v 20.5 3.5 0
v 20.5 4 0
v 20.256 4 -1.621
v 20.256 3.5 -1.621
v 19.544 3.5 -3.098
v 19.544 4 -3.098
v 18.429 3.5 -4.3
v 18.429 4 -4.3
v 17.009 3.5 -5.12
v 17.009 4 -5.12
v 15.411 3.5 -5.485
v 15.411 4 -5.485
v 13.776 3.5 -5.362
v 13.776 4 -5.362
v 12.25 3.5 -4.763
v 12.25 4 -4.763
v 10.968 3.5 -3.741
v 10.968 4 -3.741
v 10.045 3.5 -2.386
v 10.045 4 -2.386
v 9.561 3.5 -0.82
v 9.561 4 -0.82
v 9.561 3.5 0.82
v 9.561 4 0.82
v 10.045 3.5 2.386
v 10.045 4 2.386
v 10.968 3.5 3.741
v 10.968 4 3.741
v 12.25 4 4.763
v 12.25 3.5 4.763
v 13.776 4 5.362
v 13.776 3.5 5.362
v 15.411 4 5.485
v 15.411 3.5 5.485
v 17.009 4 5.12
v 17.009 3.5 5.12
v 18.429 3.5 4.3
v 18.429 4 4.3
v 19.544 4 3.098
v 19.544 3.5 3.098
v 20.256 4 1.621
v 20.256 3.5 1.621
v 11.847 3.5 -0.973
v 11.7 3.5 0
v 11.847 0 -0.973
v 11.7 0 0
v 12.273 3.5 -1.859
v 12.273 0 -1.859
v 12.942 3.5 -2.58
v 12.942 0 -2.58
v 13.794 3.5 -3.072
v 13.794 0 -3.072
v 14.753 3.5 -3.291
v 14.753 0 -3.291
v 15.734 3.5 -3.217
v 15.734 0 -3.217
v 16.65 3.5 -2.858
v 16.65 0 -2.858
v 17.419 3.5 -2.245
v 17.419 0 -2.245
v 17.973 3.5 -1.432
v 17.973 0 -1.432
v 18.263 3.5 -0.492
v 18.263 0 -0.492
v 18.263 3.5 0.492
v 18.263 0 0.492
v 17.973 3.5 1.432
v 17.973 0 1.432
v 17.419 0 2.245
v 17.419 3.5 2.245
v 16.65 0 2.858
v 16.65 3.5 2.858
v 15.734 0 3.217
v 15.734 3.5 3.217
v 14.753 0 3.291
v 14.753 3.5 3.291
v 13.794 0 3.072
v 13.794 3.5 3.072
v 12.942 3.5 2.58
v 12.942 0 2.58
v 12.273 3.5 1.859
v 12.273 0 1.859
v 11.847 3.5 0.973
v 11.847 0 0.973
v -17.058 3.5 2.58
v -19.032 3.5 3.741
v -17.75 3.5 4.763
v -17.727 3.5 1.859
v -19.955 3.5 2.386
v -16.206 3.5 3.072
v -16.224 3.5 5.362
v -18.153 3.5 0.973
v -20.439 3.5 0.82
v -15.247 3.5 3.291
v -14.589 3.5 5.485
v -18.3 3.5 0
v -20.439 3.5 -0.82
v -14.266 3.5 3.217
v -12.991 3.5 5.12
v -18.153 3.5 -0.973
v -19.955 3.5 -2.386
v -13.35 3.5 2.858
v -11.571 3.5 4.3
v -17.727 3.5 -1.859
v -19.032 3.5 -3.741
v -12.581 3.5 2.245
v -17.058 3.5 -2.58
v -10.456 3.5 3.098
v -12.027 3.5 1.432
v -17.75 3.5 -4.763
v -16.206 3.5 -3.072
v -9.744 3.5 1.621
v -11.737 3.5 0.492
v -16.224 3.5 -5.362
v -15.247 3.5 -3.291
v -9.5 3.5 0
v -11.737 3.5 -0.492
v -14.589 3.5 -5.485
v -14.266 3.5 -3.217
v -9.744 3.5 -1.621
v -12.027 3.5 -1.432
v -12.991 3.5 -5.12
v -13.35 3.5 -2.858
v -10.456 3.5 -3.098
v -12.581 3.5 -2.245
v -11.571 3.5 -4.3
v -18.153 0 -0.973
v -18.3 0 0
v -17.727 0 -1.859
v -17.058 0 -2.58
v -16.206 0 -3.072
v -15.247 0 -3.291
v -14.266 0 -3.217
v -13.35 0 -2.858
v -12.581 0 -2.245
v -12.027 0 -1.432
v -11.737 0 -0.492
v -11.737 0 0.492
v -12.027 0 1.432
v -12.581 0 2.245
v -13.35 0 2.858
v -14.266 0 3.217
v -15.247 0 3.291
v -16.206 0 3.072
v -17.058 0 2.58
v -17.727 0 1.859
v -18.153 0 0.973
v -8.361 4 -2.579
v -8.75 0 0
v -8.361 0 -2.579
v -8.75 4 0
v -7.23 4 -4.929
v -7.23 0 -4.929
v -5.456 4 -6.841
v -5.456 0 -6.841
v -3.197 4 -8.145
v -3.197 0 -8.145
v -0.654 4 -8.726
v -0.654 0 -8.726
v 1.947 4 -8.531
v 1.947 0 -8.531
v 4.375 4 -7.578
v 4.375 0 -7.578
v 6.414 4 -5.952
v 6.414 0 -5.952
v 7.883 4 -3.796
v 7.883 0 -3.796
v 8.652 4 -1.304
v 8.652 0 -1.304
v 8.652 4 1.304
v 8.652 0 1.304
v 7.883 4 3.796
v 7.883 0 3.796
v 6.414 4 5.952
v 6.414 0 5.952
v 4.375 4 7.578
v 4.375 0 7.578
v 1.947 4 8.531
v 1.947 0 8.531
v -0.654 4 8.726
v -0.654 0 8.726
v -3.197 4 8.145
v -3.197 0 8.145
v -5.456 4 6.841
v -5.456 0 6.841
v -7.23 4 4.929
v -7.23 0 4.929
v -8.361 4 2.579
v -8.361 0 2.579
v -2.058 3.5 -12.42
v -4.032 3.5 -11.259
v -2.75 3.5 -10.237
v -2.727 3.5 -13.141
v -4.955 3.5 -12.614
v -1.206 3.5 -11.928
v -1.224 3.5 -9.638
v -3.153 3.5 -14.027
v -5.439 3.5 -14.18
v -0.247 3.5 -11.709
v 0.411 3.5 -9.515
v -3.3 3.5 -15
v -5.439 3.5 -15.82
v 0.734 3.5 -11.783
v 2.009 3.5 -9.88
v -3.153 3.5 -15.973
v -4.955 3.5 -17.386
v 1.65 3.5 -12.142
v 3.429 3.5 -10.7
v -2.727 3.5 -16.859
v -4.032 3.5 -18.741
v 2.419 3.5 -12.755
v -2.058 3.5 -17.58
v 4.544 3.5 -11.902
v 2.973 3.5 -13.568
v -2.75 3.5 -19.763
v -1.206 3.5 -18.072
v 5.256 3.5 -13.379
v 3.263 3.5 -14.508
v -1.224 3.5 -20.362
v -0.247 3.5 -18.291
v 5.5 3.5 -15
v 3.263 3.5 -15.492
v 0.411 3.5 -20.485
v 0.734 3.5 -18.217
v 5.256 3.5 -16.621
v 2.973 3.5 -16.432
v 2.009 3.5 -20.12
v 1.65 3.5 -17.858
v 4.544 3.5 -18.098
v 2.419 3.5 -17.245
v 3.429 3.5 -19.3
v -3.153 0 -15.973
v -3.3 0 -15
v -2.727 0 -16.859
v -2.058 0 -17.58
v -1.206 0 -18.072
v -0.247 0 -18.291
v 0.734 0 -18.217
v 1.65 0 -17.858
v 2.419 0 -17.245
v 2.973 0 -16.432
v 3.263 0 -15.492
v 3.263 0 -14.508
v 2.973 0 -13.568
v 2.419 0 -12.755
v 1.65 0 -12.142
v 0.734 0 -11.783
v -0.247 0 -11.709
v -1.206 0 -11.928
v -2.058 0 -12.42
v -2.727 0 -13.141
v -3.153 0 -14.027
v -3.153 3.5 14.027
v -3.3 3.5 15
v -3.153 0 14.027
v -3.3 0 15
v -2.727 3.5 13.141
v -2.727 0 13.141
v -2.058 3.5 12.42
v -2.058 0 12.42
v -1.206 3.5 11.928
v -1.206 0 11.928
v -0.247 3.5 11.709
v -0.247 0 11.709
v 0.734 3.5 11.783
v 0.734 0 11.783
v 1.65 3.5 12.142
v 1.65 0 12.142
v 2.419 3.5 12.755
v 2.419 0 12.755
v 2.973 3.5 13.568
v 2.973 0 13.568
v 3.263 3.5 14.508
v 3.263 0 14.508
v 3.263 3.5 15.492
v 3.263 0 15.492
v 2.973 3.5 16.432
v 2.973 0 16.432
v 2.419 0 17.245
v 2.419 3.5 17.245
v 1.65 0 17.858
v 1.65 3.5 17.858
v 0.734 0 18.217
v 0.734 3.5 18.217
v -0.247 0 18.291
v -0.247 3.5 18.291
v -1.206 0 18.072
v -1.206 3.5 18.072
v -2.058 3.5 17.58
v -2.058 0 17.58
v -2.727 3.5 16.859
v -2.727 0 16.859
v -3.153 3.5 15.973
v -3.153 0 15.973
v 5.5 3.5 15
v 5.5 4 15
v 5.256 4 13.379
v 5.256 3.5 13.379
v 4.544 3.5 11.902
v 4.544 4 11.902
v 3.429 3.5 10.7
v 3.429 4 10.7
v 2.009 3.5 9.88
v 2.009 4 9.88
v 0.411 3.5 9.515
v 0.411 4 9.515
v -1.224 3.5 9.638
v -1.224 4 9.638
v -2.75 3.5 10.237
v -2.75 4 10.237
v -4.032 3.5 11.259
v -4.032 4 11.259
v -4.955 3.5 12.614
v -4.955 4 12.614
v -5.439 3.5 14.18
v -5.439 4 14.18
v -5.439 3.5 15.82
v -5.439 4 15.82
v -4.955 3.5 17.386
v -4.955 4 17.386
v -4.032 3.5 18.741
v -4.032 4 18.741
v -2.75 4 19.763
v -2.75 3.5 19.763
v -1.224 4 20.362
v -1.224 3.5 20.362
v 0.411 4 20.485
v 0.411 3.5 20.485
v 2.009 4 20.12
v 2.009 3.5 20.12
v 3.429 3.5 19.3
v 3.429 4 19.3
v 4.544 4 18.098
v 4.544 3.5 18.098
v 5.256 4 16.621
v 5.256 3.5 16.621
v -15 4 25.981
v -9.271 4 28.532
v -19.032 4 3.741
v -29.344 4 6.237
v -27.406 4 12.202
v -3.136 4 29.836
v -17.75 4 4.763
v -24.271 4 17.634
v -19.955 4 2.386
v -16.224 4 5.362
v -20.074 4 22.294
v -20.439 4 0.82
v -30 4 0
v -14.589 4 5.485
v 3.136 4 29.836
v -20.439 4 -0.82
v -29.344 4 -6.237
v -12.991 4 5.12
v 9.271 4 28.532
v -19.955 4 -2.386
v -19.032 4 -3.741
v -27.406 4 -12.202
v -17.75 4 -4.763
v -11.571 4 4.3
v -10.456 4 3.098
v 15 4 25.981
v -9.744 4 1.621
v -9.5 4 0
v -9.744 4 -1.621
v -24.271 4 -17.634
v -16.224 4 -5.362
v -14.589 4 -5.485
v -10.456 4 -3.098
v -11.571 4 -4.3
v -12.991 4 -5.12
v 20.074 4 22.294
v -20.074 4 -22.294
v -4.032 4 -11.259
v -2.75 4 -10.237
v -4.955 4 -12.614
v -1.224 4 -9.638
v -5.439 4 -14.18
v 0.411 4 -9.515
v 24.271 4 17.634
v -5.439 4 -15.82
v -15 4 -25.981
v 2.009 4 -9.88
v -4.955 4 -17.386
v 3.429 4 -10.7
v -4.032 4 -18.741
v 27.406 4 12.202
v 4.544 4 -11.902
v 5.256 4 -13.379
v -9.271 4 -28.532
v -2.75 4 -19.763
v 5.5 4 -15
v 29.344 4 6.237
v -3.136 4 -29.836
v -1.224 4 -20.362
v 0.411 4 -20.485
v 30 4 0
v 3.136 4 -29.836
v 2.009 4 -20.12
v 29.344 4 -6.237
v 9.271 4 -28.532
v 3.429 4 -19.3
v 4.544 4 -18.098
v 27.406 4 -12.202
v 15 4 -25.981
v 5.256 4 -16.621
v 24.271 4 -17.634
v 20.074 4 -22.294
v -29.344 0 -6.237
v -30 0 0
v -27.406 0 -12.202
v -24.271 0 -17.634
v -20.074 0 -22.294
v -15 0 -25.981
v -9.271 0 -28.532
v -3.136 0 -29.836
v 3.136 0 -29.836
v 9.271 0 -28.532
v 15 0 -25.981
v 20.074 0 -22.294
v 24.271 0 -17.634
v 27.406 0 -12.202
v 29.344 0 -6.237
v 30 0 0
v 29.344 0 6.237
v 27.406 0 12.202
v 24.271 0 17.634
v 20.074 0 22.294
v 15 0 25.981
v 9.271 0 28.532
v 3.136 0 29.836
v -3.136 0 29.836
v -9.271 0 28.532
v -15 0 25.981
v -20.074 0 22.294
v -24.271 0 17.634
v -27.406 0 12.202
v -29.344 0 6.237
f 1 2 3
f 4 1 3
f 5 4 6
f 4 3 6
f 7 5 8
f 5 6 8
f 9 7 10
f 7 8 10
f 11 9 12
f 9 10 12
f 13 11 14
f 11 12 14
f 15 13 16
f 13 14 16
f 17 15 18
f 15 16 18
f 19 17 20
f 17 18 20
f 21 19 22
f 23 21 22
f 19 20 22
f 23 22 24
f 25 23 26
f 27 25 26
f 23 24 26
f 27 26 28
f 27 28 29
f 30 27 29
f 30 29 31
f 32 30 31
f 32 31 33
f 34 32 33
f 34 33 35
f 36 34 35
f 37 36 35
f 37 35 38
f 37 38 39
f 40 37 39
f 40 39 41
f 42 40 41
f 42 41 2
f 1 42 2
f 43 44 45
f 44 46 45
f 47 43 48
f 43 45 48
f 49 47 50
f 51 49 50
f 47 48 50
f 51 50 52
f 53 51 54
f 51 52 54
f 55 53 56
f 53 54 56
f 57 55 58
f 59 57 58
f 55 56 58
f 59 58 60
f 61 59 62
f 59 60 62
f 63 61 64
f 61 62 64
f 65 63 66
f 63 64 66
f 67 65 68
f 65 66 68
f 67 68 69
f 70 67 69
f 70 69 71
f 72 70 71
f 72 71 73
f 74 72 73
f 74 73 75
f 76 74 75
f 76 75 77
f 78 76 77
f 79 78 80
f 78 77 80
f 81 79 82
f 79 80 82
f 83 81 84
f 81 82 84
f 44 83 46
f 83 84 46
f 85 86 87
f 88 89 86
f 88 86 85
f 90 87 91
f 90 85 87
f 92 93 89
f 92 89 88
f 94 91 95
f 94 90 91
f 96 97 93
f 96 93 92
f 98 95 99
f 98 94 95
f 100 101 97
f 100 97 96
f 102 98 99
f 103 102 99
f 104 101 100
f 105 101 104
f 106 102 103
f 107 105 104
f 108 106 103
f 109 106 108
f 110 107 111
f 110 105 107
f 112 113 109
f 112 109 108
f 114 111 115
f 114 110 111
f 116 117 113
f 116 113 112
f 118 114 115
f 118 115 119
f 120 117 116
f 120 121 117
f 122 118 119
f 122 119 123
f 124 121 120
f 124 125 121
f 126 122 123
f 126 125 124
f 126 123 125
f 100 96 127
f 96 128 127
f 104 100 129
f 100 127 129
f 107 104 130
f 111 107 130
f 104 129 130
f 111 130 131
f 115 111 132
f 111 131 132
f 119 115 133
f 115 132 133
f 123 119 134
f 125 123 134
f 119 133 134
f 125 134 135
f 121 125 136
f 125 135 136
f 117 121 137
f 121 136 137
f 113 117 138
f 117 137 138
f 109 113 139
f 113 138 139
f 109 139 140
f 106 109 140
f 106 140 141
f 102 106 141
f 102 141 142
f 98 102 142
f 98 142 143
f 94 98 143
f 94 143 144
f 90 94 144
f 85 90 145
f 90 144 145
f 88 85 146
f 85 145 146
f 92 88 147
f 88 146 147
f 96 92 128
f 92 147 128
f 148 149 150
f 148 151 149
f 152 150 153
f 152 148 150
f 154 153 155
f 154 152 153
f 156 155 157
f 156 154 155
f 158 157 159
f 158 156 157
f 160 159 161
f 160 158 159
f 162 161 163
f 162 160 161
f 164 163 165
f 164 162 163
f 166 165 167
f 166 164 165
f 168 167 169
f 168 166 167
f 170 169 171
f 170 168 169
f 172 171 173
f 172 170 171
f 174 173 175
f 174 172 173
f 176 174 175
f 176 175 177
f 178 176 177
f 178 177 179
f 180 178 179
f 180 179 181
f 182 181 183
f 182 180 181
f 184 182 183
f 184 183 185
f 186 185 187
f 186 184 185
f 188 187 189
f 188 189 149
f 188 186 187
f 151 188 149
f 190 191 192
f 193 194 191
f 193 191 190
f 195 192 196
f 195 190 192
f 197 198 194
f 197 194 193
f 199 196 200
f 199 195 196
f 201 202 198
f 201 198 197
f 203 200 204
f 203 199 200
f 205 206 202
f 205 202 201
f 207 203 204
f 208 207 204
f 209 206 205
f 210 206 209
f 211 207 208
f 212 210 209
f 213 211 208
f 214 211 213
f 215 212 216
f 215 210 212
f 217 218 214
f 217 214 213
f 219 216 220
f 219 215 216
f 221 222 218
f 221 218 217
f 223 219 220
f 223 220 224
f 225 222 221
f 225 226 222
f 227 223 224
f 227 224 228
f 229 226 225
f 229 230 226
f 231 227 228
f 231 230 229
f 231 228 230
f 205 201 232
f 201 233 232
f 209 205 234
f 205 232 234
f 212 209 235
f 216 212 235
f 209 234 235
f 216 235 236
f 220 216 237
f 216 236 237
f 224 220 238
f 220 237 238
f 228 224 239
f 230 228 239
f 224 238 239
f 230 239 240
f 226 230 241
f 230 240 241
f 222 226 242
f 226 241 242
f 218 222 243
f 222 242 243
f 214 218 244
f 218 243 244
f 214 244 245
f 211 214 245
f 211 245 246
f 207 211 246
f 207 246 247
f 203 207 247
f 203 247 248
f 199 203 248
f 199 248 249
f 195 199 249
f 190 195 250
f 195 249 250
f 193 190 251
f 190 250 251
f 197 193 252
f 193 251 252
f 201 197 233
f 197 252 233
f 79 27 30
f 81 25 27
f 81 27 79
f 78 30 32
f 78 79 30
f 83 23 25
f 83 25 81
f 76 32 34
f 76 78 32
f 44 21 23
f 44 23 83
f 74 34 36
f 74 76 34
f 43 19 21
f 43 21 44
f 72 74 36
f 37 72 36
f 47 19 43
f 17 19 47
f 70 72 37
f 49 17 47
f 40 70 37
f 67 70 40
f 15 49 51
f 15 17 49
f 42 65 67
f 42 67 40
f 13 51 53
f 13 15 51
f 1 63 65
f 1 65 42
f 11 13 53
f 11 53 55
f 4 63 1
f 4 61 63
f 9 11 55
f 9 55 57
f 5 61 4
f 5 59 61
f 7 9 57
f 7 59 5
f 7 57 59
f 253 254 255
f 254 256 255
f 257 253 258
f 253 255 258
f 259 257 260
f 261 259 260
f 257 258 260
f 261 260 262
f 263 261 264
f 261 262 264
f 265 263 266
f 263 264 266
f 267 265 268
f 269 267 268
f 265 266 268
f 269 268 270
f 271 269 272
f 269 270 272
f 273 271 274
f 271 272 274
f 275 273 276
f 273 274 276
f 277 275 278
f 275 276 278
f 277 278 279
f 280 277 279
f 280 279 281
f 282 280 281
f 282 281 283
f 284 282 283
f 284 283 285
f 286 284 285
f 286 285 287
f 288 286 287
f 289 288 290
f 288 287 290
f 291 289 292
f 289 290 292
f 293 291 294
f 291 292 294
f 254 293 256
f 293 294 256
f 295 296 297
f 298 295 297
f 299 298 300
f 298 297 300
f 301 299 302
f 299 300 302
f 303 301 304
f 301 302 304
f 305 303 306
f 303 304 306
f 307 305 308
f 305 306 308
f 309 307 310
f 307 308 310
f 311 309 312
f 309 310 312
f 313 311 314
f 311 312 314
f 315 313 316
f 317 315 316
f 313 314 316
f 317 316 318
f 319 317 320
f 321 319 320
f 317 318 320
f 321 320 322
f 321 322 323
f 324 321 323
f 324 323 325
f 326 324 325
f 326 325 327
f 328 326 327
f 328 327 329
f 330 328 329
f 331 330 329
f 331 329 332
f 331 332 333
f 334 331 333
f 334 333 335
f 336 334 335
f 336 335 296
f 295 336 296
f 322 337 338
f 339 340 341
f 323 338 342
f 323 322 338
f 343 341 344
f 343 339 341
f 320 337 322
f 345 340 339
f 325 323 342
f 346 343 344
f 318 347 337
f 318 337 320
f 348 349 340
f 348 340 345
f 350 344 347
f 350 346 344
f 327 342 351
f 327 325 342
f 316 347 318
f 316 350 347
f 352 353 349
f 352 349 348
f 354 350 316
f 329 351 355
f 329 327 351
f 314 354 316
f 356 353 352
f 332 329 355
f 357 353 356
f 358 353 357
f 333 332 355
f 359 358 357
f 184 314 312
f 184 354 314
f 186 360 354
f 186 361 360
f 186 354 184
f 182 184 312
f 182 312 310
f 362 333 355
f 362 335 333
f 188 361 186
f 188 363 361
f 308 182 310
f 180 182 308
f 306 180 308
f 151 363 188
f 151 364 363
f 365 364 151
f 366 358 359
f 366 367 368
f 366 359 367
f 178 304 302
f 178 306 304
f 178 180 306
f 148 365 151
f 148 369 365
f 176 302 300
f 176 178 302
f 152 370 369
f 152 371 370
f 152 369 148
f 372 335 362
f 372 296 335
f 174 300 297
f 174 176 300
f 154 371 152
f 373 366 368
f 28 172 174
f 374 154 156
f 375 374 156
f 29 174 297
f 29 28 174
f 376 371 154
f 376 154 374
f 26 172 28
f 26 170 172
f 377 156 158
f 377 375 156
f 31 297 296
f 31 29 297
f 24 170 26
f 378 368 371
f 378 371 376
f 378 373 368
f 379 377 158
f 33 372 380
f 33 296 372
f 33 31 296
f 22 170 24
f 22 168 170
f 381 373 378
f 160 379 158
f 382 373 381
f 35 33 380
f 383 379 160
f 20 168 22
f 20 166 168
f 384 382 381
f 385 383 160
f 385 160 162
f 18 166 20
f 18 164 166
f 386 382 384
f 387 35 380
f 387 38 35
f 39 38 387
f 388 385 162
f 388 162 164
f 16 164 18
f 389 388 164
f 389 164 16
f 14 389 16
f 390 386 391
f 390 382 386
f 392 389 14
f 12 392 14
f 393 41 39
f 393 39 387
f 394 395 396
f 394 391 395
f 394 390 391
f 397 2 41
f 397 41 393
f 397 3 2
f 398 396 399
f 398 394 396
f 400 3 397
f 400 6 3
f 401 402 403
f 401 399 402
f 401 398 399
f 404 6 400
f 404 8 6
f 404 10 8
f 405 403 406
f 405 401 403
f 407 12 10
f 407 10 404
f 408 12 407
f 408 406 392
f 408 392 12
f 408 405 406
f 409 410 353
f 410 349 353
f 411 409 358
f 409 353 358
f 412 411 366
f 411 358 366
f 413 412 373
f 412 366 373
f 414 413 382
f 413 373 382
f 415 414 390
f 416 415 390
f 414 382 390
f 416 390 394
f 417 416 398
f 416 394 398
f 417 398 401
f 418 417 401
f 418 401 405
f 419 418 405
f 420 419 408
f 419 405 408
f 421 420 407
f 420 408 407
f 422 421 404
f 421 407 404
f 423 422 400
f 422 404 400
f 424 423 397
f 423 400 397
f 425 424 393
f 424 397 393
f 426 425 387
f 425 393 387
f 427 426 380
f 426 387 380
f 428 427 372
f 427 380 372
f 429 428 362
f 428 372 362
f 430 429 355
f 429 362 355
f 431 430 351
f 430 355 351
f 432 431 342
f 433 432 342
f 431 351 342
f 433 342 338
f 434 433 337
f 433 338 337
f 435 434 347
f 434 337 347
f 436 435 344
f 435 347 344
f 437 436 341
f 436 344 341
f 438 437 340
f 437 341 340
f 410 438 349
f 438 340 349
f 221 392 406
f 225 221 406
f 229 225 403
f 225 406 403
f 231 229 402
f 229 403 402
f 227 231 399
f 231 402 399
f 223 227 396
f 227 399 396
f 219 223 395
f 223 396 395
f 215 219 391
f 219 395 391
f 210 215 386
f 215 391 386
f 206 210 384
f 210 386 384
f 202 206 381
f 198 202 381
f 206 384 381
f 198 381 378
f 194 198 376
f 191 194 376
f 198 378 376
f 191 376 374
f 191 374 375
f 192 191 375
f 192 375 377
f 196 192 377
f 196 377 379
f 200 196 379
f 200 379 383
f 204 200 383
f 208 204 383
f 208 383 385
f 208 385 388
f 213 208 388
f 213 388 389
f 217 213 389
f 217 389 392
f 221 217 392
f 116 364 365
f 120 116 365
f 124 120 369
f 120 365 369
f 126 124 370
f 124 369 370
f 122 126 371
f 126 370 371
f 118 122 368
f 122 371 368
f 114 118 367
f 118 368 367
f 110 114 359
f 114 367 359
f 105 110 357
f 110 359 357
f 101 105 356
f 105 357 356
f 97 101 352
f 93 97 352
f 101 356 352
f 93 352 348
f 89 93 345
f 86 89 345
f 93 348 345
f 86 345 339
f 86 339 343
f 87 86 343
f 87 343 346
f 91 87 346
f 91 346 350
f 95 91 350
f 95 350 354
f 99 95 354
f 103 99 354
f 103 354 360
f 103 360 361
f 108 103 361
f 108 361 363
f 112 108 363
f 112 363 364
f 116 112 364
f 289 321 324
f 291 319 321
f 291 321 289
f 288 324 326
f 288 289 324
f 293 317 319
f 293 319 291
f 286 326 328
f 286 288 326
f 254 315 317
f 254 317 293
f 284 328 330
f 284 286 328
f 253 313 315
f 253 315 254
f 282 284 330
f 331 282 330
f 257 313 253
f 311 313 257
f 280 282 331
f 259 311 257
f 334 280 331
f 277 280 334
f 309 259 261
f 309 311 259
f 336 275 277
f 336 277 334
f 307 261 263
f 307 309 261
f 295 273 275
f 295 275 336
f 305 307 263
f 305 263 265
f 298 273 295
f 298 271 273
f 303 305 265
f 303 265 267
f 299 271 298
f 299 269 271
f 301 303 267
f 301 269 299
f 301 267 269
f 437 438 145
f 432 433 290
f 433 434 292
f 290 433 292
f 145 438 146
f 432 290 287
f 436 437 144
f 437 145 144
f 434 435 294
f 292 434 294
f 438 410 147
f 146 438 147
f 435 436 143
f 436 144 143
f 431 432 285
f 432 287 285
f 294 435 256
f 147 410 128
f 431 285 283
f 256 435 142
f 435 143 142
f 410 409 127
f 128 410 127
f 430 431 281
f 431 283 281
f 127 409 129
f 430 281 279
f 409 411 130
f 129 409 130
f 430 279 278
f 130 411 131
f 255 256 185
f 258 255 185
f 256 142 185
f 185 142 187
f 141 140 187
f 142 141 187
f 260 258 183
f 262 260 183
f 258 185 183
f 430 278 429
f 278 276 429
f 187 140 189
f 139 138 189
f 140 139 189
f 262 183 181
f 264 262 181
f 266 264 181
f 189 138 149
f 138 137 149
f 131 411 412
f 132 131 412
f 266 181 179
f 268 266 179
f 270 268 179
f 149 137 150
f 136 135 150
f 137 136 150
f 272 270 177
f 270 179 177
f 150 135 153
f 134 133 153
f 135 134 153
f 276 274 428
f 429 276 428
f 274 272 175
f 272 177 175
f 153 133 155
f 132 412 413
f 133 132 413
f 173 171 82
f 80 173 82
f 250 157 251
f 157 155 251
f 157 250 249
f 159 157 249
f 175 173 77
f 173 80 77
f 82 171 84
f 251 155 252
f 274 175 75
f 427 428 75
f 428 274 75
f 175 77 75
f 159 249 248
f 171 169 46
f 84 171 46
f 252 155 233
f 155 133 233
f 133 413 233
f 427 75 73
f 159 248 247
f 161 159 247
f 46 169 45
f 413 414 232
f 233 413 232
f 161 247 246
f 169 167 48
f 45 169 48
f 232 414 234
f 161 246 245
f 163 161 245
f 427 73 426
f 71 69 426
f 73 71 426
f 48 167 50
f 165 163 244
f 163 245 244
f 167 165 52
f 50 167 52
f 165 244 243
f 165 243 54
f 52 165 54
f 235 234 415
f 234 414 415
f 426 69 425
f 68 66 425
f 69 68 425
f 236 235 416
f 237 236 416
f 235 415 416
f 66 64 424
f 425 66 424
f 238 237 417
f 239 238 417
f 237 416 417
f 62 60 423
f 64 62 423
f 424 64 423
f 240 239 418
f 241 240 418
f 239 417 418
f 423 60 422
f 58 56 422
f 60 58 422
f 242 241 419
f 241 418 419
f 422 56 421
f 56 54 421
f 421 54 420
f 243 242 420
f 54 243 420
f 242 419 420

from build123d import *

# Parameters (mm, degrees)
SKETCH_1_W                   = 21.25
SKETCH_1_H                   = 4
HOLE_WIZARD_M6_1_D           = 6.6
HOLE_WIZARD_M6_1_CBORE_D     = 11
HOLE_WIZARD_M6_1_CBORE_DEPTH = 0.5


with BuildPart() as part:
    # 草图1 → 旋转1 (revolve)
    with BuildSketch(Plane.XY, mode=Mode.PRIVATE) as revolve_1_sk:
        with Locations((19.375, 2)):
            Rectangle(SKETCH_1_W, SKETCH_1_H)
    revolve(revolve_1_sk.sketch.rotate(Axis((0, 4, 0), (0, -1, 0)), 180), axis=Axis((0, 4, 0), (0, -1, 0)))

    # M6 六角头螺栓的柱形沉头孔1 (through all)
    with Locations(Plane(origin=(0, 4, 0), x_dir=(1, 0, 0), z_dir=(0, 1, 0))):
        with Locations((15, 0), (0, -15), (-15, 0), (0, 15)):
            CounterBoreHole(HOLE_WIZARD_M6_1_D / 2, HOLE_WIZARD_M6_1_CBORE_D / 2, HOLE_WIZARD_M6_1_CBORE_DEPTH)


solid = part.part
